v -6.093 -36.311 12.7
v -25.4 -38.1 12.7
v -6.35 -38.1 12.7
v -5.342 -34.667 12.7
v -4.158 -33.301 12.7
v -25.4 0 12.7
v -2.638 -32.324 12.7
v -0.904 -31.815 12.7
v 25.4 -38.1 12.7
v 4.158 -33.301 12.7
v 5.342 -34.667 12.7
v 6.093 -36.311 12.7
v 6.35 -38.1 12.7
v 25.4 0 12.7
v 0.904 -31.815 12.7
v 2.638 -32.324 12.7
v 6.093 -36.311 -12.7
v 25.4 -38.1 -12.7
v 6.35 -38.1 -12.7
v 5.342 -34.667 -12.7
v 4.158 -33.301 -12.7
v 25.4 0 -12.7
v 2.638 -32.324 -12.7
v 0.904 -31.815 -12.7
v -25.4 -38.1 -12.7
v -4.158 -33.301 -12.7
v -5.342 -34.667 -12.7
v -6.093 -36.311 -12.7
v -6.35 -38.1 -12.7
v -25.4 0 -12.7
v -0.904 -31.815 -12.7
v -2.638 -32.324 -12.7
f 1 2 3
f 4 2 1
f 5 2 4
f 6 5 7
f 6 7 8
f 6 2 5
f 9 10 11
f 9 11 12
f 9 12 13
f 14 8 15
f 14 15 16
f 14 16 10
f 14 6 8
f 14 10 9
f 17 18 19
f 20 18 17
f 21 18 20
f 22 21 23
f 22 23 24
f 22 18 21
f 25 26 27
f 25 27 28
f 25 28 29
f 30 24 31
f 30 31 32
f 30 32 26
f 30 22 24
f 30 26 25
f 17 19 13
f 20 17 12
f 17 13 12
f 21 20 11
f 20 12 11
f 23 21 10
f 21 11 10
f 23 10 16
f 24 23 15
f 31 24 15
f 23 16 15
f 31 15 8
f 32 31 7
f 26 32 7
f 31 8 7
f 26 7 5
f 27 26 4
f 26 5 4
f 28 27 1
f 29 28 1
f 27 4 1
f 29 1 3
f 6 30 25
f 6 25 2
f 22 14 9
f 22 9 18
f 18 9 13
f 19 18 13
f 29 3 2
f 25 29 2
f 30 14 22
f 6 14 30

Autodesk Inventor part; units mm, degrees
ref_plane "YZ Plane" through (0, 0, 0) normal (1, 0, 0) x (0, 1, 0)
ref_plane "XZ Plane" through (0, 0, 0) normal (0, 1, 0) x (-1, 0, 0)
ref_plane "XY Plane" through (0, 0, 0) normal (0, 0, 1) x (1, 0, 0)
sketch "Sketch1" plane through (0, 0, 0) normal (0, 1, 0) x (-1, 0, 0)
  line L0 (25.4, 12.7) -> (-25.4, 12.7)
  line L1 (-25.4, 12.7) -> (-25.4, -12.7)
  line L2 (-25.4, -12.7) -> (25.4, -12.7)
  line L3 (25.4, -12.7) -> (25.4, 12.7)
  line L4 (25.4, 12.7) -> (-25.4, -12.7) construction
  line L5 (-25.4, 12.7) -> (25.4, -12.7) construction
  point P0 (0, 0)
  dimension "d0" = 25.4
  dimension "d1" = 50.8
extrude "Extrusion1" add sketch "Sketch1" against normal blind 38.1
sketch "Sketch2" plane through (-25.4, 0, 12.7) normal (0, 0, 1) x (1, 0, 0)
  line L0 (50.8, -38.1) -> (0, -38.1) projected
  circle A0 centre (25.4, -38.1) radius 6.35
  point P0 (25.4, 0)
  dimension "d4" = 12.7
extrude "Extrusion2" cut sketch "Sketch2" against normal through all
properties part number "StandAloneLift"
